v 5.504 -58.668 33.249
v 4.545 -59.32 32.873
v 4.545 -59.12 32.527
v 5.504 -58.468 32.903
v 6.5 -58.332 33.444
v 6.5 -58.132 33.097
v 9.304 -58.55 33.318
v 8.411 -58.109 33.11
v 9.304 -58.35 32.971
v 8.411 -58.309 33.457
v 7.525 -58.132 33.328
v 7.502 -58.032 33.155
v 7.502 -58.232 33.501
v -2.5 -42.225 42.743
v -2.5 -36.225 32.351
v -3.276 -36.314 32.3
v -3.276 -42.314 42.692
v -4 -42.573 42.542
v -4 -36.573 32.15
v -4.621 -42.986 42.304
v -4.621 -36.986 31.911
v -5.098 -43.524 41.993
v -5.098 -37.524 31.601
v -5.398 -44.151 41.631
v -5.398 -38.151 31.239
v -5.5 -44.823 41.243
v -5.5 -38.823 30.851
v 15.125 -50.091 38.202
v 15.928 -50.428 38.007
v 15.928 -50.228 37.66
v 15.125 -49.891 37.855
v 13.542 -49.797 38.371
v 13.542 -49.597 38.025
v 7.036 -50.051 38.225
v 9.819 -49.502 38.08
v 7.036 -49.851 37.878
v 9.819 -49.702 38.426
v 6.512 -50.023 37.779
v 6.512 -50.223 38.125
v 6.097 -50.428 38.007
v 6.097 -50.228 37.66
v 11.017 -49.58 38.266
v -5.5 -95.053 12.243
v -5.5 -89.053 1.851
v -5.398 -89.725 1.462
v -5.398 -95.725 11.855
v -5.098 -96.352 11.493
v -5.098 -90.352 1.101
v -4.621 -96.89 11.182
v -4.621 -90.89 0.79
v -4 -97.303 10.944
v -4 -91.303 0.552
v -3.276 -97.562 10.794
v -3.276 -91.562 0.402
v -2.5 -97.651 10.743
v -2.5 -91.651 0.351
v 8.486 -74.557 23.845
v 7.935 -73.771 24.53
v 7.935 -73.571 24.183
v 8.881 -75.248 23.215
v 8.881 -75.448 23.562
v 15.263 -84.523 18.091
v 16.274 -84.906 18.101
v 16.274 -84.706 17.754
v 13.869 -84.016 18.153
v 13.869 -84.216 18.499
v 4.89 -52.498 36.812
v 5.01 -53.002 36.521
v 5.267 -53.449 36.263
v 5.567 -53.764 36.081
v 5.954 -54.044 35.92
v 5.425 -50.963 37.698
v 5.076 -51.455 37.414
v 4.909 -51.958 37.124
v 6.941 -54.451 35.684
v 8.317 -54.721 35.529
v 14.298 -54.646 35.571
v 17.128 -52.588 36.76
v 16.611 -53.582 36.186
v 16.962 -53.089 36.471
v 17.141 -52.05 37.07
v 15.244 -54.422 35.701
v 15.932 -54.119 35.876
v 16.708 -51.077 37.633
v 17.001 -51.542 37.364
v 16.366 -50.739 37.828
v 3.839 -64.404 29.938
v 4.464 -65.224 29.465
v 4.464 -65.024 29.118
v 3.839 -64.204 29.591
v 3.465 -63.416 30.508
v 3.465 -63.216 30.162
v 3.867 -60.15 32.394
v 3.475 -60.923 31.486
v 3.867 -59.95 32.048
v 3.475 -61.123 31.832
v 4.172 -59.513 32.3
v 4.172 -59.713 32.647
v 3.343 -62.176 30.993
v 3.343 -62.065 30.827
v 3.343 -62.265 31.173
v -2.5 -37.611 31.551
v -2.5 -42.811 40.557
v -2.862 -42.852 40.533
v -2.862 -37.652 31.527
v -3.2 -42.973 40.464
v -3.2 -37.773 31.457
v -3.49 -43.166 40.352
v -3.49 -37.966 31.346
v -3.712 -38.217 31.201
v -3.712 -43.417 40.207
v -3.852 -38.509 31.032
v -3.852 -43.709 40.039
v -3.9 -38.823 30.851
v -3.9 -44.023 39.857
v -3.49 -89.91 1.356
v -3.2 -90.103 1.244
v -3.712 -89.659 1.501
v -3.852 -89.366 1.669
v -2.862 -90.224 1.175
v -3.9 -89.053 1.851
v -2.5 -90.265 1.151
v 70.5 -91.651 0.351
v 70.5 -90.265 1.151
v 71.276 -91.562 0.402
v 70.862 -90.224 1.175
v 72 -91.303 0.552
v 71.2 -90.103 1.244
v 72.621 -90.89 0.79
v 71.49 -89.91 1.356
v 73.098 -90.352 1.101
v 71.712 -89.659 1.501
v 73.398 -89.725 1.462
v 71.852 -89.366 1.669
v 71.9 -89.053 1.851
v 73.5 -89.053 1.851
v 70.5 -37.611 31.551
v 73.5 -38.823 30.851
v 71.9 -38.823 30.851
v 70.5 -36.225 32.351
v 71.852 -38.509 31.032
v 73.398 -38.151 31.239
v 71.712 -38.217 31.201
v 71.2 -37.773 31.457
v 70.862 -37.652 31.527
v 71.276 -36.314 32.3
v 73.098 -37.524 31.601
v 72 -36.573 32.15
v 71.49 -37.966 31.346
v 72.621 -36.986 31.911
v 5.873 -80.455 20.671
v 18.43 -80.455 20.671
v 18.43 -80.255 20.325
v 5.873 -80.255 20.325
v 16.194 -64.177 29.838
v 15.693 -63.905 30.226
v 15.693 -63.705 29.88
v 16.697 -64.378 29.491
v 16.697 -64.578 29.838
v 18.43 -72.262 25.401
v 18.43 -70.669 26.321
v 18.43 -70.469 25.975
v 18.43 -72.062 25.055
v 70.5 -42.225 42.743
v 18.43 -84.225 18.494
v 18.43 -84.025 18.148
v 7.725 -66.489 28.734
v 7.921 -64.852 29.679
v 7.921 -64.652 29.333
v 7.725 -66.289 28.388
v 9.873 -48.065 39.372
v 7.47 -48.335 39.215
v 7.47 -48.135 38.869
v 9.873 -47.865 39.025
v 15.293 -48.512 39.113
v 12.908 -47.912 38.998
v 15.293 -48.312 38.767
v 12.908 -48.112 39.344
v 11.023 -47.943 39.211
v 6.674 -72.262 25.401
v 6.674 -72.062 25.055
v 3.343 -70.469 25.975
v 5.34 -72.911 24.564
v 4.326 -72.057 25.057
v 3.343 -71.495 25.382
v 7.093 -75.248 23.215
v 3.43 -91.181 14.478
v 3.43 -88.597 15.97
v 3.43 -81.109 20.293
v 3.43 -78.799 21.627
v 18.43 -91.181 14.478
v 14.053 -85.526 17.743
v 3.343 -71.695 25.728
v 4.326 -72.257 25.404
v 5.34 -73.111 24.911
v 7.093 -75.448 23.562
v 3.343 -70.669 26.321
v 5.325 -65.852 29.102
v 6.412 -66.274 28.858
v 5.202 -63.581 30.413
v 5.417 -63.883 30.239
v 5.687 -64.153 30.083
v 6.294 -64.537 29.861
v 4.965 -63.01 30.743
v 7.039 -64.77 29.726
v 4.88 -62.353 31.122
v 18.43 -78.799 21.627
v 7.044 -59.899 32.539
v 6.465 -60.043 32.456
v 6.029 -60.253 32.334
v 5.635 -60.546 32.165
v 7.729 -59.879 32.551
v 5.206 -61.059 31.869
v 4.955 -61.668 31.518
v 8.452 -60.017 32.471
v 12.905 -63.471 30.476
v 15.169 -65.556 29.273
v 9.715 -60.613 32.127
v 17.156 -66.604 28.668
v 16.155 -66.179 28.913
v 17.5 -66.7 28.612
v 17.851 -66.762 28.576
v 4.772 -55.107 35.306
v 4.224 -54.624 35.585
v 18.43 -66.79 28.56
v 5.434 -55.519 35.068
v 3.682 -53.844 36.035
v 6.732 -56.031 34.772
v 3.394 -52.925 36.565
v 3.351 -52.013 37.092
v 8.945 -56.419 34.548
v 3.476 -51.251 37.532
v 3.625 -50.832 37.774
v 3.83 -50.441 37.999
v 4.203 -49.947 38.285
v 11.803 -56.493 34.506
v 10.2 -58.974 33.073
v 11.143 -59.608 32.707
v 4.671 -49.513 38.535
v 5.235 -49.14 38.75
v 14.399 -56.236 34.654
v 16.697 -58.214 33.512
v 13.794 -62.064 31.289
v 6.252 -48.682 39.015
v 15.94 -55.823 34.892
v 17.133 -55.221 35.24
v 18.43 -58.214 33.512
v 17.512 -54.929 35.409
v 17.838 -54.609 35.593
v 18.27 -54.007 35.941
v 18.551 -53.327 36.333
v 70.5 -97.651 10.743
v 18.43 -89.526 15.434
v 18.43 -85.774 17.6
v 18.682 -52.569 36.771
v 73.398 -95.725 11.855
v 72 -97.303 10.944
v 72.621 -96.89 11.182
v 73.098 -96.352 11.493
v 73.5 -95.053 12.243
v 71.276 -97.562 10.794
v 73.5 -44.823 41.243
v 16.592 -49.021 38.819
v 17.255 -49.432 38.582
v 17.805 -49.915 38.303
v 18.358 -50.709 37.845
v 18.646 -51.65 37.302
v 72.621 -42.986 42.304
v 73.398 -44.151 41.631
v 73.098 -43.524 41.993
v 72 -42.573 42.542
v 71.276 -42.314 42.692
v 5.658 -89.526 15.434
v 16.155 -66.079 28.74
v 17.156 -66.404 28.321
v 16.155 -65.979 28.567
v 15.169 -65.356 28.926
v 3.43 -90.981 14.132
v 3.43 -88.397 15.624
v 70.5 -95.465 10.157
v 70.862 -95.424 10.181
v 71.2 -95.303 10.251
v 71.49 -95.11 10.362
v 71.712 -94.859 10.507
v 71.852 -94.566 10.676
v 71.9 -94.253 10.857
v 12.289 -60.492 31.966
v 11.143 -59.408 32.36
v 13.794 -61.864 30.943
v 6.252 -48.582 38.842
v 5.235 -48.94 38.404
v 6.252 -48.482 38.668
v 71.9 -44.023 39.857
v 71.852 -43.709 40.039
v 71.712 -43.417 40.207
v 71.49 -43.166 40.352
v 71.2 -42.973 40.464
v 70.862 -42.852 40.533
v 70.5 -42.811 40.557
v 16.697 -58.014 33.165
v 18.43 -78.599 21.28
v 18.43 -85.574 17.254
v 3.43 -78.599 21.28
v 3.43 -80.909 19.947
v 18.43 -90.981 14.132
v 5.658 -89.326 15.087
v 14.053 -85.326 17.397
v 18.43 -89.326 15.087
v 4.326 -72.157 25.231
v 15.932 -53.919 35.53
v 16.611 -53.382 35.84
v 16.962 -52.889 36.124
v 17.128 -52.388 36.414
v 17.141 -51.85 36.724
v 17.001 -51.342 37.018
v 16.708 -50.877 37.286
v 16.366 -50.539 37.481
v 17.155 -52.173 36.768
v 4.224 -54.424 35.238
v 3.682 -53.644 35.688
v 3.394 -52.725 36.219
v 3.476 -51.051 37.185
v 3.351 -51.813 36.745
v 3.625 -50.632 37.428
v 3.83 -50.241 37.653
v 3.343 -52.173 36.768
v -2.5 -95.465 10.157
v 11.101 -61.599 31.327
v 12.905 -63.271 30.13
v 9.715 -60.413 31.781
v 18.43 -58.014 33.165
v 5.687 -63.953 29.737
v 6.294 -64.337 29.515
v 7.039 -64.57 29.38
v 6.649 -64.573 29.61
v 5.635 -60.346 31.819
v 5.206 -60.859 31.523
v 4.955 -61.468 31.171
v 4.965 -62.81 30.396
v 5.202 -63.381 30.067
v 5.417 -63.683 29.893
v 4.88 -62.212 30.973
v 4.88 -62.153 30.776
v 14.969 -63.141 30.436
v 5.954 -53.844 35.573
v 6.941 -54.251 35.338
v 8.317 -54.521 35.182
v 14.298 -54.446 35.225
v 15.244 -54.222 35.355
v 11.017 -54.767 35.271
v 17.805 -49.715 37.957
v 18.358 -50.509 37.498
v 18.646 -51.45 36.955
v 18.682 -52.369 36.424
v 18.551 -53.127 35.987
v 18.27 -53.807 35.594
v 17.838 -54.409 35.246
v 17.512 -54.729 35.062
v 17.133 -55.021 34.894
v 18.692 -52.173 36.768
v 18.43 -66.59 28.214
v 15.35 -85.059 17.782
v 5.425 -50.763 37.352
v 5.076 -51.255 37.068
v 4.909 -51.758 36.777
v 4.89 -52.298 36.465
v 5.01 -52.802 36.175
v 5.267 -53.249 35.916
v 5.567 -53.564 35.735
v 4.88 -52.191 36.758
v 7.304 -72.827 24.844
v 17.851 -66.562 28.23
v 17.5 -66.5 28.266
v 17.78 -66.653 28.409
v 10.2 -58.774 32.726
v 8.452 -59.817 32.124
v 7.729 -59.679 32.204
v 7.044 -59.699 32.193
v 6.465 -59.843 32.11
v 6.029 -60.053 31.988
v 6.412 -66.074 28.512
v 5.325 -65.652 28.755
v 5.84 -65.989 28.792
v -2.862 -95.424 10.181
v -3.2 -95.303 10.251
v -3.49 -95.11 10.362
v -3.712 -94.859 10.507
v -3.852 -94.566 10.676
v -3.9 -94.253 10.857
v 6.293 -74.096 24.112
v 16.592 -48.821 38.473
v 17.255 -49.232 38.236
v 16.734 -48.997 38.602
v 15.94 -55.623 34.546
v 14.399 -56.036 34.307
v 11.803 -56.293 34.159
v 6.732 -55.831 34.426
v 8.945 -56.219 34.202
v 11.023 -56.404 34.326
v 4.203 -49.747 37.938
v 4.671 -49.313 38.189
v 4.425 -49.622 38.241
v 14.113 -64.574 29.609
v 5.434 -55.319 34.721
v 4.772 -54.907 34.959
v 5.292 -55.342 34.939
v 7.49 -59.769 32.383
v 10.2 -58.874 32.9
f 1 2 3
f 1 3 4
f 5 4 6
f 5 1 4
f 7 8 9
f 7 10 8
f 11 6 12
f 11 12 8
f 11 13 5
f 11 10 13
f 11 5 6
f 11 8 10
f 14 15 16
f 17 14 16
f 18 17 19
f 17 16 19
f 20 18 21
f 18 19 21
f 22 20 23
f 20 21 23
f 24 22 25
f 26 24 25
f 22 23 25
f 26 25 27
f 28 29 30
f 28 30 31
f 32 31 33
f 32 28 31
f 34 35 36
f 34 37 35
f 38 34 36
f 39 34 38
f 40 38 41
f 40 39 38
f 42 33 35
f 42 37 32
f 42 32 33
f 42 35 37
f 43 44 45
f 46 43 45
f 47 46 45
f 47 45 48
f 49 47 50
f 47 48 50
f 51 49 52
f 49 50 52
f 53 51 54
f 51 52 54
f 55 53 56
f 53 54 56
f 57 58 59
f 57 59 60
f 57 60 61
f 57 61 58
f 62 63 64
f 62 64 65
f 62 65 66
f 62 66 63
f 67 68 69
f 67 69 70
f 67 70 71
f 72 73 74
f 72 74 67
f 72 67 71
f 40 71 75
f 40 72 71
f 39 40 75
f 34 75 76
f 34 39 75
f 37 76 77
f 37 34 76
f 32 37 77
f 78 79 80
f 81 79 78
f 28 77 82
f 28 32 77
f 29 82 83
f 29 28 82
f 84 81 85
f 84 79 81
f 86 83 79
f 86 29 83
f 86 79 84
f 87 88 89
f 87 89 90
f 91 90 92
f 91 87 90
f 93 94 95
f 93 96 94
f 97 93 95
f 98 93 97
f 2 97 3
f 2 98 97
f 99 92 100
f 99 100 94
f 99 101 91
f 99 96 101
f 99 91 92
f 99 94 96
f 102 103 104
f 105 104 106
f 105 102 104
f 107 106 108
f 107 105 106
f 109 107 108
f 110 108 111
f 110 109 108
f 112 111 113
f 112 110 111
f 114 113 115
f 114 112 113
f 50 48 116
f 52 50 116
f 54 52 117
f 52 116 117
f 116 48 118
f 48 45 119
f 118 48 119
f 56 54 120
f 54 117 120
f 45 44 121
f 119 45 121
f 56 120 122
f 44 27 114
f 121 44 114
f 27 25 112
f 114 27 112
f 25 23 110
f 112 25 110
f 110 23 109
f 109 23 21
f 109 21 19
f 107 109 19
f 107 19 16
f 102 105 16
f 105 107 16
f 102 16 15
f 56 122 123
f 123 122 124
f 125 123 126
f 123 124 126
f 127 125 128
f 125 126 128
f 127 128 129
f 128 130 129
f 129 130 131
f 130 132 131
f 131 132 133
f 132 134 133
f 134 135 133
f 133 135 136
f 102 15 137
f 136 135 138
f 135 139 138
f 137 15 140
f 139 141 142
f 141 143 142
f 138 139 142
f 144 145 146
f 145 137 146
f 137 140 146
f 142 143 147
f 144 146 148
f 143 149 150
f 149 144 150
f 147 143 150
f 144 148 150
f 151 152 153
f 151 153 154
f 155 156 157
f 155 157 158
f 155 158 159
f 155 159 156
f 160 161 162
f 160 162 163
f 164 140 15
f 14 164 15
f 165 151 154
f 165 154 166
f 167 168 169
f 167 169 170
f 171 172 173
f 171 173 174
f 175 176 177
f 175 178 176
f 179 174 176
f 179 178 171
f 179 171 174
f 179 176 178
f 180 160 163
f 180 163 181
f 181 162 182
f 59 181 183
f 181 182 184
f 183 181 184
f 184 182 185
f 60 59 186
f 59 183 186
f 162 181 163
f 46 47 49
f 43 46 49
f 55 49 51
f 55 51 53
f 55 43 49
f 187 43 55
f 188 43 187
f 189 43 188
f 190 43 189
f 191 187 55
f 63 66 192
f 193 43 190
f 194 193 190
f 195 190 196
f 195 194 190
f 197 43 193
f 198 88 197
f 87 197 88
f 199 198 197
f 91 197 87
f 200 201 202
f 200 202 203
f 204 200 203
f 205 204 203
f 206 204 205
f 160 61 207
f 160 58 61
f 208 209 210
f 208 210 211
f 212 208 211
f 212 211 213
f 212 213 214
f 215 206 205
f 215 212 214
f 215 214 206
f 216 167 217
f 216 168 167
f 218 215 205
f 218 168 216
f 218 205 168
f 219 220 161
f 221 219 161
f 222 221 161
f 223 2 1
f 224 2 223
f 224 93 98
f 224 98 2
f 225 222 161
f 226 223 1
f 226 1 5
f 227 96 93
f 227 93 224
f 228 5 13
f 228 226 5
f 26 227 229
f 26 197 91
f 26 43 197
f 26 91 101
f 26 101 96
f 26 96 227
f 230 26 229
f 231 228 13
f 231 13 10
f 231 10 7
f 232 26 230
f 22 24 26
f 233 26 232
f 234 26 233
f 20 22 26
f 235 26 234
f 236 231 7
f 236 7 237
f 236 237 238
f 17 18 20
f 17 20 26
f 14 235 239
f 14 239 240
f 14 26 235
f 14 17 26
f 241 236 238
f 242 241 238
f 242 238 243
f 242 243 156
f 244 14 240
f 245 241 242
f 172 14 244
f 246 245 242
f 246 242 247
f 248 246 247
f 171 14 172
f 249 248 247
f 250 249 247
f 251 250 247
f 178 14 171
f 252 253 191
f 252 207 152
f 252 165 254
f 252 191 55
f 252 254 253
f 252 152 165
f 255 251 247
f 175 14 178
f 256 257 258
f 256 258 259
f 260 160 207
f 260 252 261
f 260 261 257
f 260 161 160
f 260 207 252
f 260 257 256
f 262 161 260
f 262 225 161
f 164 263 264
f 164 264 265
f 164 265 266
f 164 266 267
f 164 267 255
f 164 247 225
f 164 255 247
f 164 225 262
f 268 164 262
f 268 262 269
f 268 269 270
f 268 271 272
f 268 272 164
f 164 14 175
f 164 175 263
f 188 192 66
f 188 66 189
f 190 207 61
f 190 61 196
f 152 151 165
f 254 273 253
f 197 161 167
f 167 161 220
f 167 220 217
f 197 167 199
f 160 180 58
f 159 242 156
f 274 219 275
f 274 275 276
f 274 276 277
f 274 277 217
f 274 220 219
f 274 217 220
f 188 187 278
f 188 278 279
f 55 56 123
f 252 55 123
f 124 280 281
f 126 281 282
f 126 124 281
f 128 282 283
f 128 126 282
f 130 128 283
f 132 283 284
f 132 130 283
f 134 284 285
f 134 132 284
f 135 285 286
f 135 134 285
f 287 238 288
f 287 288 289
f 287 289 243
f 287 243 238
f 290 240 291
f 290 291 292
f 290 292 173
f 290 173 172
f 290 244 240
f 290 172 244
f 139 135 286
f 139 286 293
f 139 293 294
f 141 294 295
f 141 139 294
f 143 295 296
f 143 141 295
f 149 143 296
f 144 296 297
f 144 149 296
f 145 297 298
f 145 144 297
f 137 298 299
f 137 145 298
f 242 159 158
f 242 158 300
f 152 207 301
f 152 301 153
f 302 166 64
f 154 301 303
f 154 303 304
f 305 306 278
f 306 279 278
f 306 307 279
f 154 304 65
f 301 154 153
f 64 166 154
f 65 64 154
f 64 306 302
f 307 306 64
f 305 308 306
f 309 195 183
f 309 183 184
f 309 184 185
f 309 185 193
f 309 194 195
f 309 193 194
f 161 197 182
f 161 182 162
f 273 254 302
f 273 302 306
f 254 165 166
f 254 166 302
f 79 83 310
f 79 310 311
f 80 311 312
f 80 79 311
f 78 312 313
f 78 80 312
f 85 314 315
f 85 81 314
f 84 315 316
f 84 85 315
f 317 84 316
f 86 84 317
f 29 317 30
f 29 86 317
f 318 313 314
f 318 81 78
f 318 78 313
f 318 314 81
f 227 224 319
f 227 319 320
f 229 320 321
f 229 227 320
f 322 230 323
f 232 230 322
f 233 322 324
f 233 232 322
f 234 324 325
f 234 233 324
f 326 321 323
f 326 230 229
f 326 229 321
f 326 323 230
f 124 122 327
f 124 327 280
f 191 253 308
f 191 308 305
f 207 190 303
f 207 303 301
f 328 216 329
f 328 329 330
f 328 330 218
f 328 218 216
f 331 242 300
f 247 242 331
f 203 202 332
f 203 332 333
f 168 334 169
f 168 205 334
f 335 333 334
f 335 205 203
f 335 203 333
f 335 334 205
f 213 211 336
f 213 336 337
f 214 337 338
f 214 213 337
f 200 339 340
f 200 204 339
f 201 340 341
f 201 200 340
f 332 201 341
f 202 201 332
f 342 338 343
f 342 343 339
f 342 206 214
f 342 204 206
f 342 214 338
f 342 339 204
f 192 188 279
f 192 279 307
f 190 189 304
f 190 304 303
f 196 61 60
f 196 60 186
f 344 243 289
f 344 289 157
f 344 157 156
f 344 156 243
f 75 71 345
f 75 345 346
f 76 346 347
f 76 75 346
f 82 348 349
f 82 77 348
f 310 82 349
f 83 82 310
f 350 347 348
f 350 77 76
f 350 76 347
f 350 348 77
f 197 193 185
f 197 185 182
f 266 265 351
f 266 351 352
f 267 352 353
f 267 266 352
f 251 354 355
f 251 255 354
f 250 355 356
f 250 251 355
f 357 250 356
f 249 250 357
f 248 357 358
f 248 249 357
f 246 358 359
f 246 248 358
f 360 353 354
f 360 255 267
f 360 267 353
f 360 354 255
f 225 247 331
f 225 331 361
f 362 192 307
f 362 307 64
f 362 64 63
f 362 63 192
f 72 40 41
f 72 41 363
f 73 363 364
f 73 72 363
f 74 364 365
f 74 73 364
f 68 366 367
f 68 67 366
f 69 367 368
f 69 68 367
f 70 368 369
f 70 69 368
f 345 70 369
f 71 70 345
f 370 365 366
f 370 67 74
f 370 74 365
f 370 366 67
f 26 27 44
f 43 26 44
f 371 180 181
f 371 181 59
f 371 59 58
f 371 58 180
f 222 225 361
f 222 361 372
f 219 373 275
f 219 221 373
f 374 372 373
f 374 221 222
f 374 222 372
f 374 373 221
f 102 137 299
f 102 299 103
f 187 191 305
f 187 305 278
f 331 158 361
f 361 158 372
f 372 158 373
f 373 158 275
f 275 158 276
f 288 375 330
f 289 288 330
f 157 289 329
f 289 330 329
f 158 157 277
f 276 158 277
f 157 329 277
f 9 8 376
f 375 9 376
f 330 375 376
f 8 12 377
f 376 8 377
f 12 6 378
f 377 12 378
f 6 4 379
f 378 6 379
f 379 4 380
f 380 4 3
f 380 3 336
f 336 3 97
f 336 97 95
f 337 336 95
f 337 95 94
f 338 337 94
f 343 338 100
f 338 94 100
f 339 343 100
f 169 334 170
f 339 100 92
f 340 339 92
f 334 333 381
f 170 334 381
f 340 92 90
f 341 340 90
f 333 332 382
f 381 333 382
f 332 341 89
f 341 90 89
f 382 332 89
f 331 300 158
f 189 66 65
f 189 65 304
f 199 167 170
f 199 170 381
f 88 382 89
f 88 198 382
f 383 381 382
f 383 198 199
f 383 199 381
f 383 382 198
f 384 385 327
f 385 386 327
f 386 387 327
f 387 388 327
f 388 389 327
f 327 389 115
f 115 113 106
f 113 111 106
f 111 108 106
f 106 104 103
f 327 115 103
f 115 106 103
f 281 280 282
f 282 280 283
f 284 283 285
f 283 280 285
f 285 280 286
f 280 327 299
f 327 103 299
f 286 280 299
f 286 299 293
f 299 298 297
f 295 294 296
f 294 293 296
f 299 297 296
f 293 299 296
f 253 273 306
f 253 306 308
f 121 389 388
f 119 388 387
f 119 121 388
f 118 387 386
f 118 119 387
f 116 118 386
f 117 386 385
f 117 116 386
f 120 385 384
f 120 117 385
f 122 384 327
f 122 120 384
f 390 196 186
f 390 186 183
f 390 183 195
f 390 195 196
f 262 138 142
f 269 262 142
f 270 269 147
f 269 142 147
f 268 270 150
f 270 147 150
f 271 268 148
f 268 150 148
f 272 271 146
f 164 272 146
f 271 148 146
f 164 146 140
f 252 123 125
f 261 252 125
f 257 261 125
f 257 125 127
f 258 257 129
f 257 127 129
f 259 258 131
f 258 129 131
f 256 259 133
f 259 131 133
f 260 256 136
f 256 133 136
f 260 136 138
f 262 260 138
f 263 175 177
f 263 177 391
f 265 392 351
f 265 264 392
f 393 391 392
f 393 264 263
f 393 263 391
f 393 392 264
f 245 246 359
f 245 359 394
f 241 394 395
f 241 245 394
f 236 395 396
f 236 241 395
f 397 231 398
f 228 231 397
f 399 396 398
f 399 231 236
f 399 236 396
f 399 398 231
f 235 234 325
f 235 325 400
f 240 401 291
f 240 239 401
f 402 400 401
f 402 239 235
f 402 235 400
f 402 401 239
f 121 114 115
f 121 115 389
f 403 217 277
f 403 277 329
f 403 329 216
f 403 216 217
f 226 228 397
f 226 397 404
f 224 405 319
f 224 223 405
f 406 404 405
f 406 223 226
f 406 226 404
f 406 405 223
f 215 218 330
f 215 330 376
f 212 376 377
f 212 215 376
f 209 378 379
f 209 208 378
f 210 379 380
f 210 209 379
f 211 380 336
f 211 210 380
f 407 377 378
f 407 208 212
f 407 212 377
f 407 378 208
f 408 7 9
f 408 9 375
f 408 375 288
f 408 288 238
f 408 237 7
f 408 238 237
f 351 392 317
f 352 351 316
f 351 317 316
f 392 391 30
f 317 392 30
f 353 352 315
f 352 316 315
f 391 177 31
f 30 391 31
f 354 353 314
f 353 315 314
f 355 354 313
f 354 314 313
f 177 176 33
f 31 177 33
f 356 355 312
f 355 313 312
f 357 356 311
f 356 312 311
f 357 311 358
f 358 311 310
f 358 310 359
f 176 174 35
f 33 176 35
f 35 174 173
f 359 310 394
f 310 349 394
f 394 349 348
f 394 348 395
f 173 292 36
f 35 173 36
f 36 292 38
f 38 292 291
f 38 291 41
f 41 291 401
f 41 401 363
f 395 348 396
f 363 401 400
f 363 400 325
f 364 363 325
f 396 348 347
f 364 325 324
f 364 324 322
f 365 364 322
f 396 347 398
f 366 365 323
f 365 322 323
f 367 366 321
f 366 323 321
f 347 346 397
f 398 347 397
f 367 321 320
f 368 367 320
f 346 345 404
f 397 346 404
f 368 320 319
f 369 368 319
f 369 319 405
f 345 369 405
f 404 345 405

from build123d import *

# Parameters (mm, degrees)
PAD006_DEPTH            = 12
THICKNESS_T             = -1.6
POCKET005_DEPTH         = 0.4
BODY005_PLACEMENT_ANGLE = 30


with BuildPart() as part:
    # Sketch011 → Pad006 (new body)
    with BuildSketch(Plane.XY):
        with BuildLine():
            Line((-39.5, 29), (-39.5, -29))
            ThreePointArc((-39.5, -29), (-38.62132, -31.12132), (-36.5, -32))
            Line((-36.5, -32), (36.5, -32))
            ThreePointArc((36.5, -32), (38.62132, -31.12132), (39.5, -29))
            Line((39.5, -29), (39.5, 29))
            ThreePointArc((39.5, 29), (38.62132, 31.12132), (36.5, 32))
            Line((36.5, 32), (-36.5, 32))
            ThreePointArc((-36.5, 32), (-38.62132, 31.12132), (-39.5, 29))
        make_face()
    extrude(amount=PAD006_DEPTH)

    # Thickness
    thickness_openings = [part.faces().sort_by_distance(p)[0] for p in [
        (0, 0, 0),
    ]]
    offset(amount=THICKNESS_T, openings=thickness_openings)

    # Sketch012 (on Face9 of Thickness) → Pocket005 (cut)
    with BuildSketch(Plane(origin=(-25, 7, 12), x_dir=(0, 1, 0), z_dir=(0, 0, 1))):
        with BuildLine():
            Line((-31.53, -9.43), (-31.53, 5.57))
            Line((-31.53, 5.57), (-28.545807, 5.57))
            Line((-28.545807, 5.57), (-24.999522, -5.053183))
            add(Edge.make_bspline(
                [(-24.999522, -5.053183), (-24.50897, -6.537104), (-24.284133, -7.273614)],
                knots=[0, 0, 0, 1, 1, 1], degree=2))
            add(Edge.make_bspline(
                [(-24.284133, -7.273614), (-24.028637, -6.454664), (-23.486986, -4.868545)],
                knots=[0, 0, 0, 1, 1, 1], degree=2))
            Line((-23.486986, -4.868545), (-19.899822, 5.57))
            Line((-19.899822, 5.57), (-17.232444, 5.57))
            Line((-17.232444, 5.57), (-17.232444, -9.43))
            Line((-17.232444, -9.43), (-19.143554, -9.43))
            Line((-19.143554, -9.43), (-19.143554, 3.127458))
            Line((-19.143554, 3.127458), (-23.497206, -9.43))
            Line((-23.497206, -9.43), (-25.285678, -9.43))
            Line((-25.285678, -9.43), (-29.61889, 3.342075))
            Line((-29.61889, 3.342075), (-29.61889, -9.43))
            Line((-29.61889, -9.43), (-31.53, -9.43))
        make_face()
        with BuildLine():
            Line((-7.843817, -9.43), (-9.683388, -9.43))
            Line((-9.683388, -9.43), (-9.683388, 2.326223))
            add(Edge.make_bspline(
                [(-9.683388, 2.326223), (-10.347678, 1.695999), (-11.426212, 1.065094)],
                knots=[0, 0, 0, 1, 1, 1], degree=2))
            add(Edge.make_bspline(
                [(-11.426212, 1.065094), (-12.504064, 0.434871), (-13.362531, 0.119419)],
                knots=[0, 0, 0, 1, 1, 1], degree=2))
            Line((-13.362531, 0.119419), (-13.362531, 1.907209))
            add(Edge.make_bspline(
                [(-13.362531, 1.907209), (-11.819335, 2.630774), (-10.664493, 3.659571)],
                knots=[0, 0, 0, 1, 1, 1], degree=2))
            add(Edge.make_bspline(
                [(-10.664493, 3.659571), (-9.509651, 4.68905), (-9.029319, 5.657209)],
                knots=[0, 0, 0, 1, 1, 1], degree=2))
            Line((-9.029319, 5.657209), (-7.843817, 5.657209))
            Line((-7.843817, 5.657209), (-7.843817, -9.43))
        make_face()
        with BuildLine():
            Line((6.537542, -7.696715), (6.537542, -9.43))
            Line((6.537542, -9.43), (-3.365483, -9.43))
            add(Edge.make_bspline(
                [(-3.365483, -9.43), (-3.385923, -8.767754), (-3.150867, -8.155927)],
                knots=[0, 0, 0, 1, 1, 1], degree=2))
            add(Edge.make_bspline(
                [(-3.150867, -8.155927), (-2.772732, -7.146888), (-1.940156, -6.168508)],
                knots=[0, 0, 0, 1, 1, 1], degree=2))
            add(Edge.make_bspline(
                [(-1.940156, -6.168508), (-1.106899, -5.189448), (0.466957, -3.905154)],
                knots=[0, 0, 0, 1, 1, 1], degree=2))
            add(Edge.make_bspline(
                [(0.466957, -3.905154), (2.909499, -1.891165), (3.767965, -0.71452)],
                knots=[0, 0, 0, 1, 1, 1], degree=2))
            add(Edge.make_bspline(
                [(3.767965, -0.71452), (4.626432, 0.462124), (4.626432, 1.509998)],
                knots=[0, 0, 0, 1, 1, 1], degree=2))
            add(Edge.make_bspline(
                [(4.626432, 1.509998), (4.626432, 2.609653), (3.844273, 3.364559)],
                knots=[0, 0, 0, 1, 1, 1], degree=2))
            add(Edge.make_bspline(
                [(3.844273, 3.364559), (3.062796, 4.120145), (1.805756, 4.120145)],
                knots=[0, 0, 0, 1, 1, 1], degree=2))
            add(Edge.make_bspline(
                [(1.805756, 4.120145), (0.477177, 4.120145), (-0.319971, 3.312778)],
                knots=[0, 0, 0, 1, 1, 1], degree=2))
            add(Edge.make_bspline(
                [(-0.319971, 3.312778), (-1.117118, 2.506092), (-1.127338, 1.078721)],
                knots=[0, 0, 0, 1, 1, 1], degree=2))
            Line((-1.127338, 1.078721), (-3.018009, 1.274942))
            add(Edge.make_bspline(
                [(-3.018009, 1.274942), (-2.823832, 3.414295), (-1.556571, 4.535752)],
                knots=[0, 0, 0, 1, 1, 1], degree=2))
            add(Edge.make_bspline(
                [(-1.556571, 4.535752), (-0.289311, 5.657209), (1.846635, 5.657209)],
                knots=[0, 0, 0, 1, 1, 1], degree=2))
            add(Edge.make_bspline(
                [(1.846635, 5.657209), (4.003022, 5.657209), (5.260062, 4.454675)],
                knots=[0, 0, 0, 1, 1, 1], degree=2))
            add(Edge.make_bspline(
                [(5.260062, 4.454675), (6.517102, 3.25214), (6.517102, 1.474569)],
                knots=[0, 0, 0, 1, 1, 1], degree=2))
            add(Edge.make_bspline(
                [(6.517102, 1.474569), (6.517102, 0.570454), (6.149188, -0.303683)],
                knots=[0, 0, 0, 1, 1, 1], degree=2))
            add(Edge.make_bspline(
                [(6.149188, -0.303683), (5.781274, -1.177138), (4.927576, -2.143254)],
                knots=[0, 0, 0, 1, 1, 1], degree=2))
            add(Edge.make_bspline(
                [(4.927576, -2.143254), (4.07456, -3.108688), (2.091911, -4.794281)],
                knots=[0, 0, 0, 1, 1, 1], degree=2))
            add(Edge.make_bspline(
                [(2.091911, -4.794281), (0.436297, -6.193717), (-0.033815, -6.693127)],
                knots=[0, 0, 0, 1, 1, 1], degree=2))
            add(Edge.make_bspline(
                [(-0.033815, -6.693127), (-0.503928, -7.192536), (-0.810523, -7.696715)],
                knots=[0, 0, 0, 1, 1, 1], degree=2))
            Line((-0.810523, -7.696715), (6.537542, -7.696715))
        make_face()
        with BuildLine():
            add(Edge.make_bspline(
                [(8.512015, -2.02266), (8.512015, 0.643356), (9.058436, 2.26831)],
                knots=[0, 0, 0, 1, 1, 1], degree=2))
            add(Edge.make_bspline(
                [(9.058436, 2.26831), (9.605538, 3.893946), (10.68339, 4.775578)],
                knots=[0, 0, 0, 1, 1, 1], degree=2))
            add(Edge.make_bspline(
                [(10.68339, 4.775578), (11.761924, 5.657209), (13.397099, 5.657209)],
                knots=[0, 0, 0, 1, 1, 1], degree=2))
            add(Edge.make_bspline(
                [(13.397099, 5.657209), (14.60304, 5.657209), (15.512605, 5.170064)],
                knots=[0, 0, 0, 1, 1, 1], degree=2))
            add(Edge.make_bspline(
                [(15.512605, 5.170064), (16.422171, 4.682918), (17.014922, 3.765176)],
                knots=[0, 0, 0, 1, 1, 1], degree=2))
            add(Edge.make_bspline(
                [(17.014922, 3.765176), (17.607673, 2.848116), (17.944927, 1.530438)],
                knots=[0, 0, 0, 1, 1, 1], degree=2))
            add(Edge.make_bspline(
                [(17.944927, 1.530438), (18.282182, 0.21276), (18.282182, -2.02266)],
                knots=[0, 0, 0, 1, 1, 1], degree=2))
            add(Edge.make_bspline(
                [(18.282182, -2.02266), (18.282182, -4.667555), (17.740531, -6.29319)],
                knots=[0, 0, 0, 1, 1, 1], degree=2))
            add(Edge.make_bspline(
                [(17.740531, -6.29319), (17.198879, -7.918145), (16.120345, -8.805227)],
                knots=[0, 0, 0, 1, 1, 1], degree=2))
            add(Edge.make_bspline(
                [(16.120345, -8.805227), (15.042493, -9.691628), (13.397099, -9.691628)],
                knots=[0, 0, 0, 1, 1, 1], degree=2))
            add(Edge.make_bspline(
                [(13.397099, -9.691628), (11.230492, -9.691628), (9.993892, -8.133443)],
                knots=[0, 0, 0, 1, 1, 1], degree=2))
            add(Edge.make_bspline(
                [(9.993892, -8.133443), (8.512015, -6.25708), (8.512015, -2.02266)],
                knots=[0, 0, 0, 1, 1, 1], degree=2))
        make_face()
        with BuildLine():
            add(Edge.make_bspline(
                [(10.402685, -2.017209), (10.402685, -5.709978), (11.265921, -6.932271)],
                knots=[0, 0, 0, 1, 1, 1], degree=2))
            add(Edge.make_bspline(
                [(11.265921, -6.932271), (12.129838, -8.154564), (13.397099, -8.154564)],
                knots=[0, 0, 0, 1, 1, 1], degree=2))
            add(Edge.make_bspline(
                [(13.397099, -8.154564), (14.664359, -8.154564), (15.527595, -6.927502)],
                knots=[0, 0, 0, 1, 1, 1], degree=2))
            add(Edge.make_bspline(
                [(15.527595, -6.927502), (16.391512, -5.699758), (16.391512, -2.017209)],
                knots=[0, 0, 0, 1, 1, 1], degree=2))
            add(Edge.make_bspline(
                [(16.391512, -2.017209), (16.391512, 1.685779), (15.527595, 2.902622)],
                knots=[0, 0, 0, 1, 1, 1], degree=2))
            add(Edge.make_bspline(
                [(15.527595, 2.902622), (14.664359, 4.120145), (13.376659, 4.120145)],
                knots=[0, 0, 0, 1, 1, 1], degree=2))
            add(Edge.make_bspline(
                [(13.376659, 4.120145), (12.109399, 4.120145), (11.353131, 3.046381)],
                knots=[0, 0, 0, 1, 1, 1], degree=2))
            add(Edge.make_bspline(
                [(11.353131, 3.046381), (10.402685, 1.67556), (10.402685, -2.017209)],
                knots=[0, 0, 0, 1, 1, 1], degree=2))
        make_face(mode=Mode.SUBTRACT)
    extrude(amount=-POCKET005_DEPTH, mode=Mode.SUBTRACT)


with BuildPart() as part_1:
    # Body005 placement: moved
    add(part.part.moved(Location((34, -63.937892, 16.350669))).rotate(Axis((34, -63.937892, 16.350669), (1, 0, 0)), BODY005_PLACEMENT_ANGLE))


solid = part_1.part
